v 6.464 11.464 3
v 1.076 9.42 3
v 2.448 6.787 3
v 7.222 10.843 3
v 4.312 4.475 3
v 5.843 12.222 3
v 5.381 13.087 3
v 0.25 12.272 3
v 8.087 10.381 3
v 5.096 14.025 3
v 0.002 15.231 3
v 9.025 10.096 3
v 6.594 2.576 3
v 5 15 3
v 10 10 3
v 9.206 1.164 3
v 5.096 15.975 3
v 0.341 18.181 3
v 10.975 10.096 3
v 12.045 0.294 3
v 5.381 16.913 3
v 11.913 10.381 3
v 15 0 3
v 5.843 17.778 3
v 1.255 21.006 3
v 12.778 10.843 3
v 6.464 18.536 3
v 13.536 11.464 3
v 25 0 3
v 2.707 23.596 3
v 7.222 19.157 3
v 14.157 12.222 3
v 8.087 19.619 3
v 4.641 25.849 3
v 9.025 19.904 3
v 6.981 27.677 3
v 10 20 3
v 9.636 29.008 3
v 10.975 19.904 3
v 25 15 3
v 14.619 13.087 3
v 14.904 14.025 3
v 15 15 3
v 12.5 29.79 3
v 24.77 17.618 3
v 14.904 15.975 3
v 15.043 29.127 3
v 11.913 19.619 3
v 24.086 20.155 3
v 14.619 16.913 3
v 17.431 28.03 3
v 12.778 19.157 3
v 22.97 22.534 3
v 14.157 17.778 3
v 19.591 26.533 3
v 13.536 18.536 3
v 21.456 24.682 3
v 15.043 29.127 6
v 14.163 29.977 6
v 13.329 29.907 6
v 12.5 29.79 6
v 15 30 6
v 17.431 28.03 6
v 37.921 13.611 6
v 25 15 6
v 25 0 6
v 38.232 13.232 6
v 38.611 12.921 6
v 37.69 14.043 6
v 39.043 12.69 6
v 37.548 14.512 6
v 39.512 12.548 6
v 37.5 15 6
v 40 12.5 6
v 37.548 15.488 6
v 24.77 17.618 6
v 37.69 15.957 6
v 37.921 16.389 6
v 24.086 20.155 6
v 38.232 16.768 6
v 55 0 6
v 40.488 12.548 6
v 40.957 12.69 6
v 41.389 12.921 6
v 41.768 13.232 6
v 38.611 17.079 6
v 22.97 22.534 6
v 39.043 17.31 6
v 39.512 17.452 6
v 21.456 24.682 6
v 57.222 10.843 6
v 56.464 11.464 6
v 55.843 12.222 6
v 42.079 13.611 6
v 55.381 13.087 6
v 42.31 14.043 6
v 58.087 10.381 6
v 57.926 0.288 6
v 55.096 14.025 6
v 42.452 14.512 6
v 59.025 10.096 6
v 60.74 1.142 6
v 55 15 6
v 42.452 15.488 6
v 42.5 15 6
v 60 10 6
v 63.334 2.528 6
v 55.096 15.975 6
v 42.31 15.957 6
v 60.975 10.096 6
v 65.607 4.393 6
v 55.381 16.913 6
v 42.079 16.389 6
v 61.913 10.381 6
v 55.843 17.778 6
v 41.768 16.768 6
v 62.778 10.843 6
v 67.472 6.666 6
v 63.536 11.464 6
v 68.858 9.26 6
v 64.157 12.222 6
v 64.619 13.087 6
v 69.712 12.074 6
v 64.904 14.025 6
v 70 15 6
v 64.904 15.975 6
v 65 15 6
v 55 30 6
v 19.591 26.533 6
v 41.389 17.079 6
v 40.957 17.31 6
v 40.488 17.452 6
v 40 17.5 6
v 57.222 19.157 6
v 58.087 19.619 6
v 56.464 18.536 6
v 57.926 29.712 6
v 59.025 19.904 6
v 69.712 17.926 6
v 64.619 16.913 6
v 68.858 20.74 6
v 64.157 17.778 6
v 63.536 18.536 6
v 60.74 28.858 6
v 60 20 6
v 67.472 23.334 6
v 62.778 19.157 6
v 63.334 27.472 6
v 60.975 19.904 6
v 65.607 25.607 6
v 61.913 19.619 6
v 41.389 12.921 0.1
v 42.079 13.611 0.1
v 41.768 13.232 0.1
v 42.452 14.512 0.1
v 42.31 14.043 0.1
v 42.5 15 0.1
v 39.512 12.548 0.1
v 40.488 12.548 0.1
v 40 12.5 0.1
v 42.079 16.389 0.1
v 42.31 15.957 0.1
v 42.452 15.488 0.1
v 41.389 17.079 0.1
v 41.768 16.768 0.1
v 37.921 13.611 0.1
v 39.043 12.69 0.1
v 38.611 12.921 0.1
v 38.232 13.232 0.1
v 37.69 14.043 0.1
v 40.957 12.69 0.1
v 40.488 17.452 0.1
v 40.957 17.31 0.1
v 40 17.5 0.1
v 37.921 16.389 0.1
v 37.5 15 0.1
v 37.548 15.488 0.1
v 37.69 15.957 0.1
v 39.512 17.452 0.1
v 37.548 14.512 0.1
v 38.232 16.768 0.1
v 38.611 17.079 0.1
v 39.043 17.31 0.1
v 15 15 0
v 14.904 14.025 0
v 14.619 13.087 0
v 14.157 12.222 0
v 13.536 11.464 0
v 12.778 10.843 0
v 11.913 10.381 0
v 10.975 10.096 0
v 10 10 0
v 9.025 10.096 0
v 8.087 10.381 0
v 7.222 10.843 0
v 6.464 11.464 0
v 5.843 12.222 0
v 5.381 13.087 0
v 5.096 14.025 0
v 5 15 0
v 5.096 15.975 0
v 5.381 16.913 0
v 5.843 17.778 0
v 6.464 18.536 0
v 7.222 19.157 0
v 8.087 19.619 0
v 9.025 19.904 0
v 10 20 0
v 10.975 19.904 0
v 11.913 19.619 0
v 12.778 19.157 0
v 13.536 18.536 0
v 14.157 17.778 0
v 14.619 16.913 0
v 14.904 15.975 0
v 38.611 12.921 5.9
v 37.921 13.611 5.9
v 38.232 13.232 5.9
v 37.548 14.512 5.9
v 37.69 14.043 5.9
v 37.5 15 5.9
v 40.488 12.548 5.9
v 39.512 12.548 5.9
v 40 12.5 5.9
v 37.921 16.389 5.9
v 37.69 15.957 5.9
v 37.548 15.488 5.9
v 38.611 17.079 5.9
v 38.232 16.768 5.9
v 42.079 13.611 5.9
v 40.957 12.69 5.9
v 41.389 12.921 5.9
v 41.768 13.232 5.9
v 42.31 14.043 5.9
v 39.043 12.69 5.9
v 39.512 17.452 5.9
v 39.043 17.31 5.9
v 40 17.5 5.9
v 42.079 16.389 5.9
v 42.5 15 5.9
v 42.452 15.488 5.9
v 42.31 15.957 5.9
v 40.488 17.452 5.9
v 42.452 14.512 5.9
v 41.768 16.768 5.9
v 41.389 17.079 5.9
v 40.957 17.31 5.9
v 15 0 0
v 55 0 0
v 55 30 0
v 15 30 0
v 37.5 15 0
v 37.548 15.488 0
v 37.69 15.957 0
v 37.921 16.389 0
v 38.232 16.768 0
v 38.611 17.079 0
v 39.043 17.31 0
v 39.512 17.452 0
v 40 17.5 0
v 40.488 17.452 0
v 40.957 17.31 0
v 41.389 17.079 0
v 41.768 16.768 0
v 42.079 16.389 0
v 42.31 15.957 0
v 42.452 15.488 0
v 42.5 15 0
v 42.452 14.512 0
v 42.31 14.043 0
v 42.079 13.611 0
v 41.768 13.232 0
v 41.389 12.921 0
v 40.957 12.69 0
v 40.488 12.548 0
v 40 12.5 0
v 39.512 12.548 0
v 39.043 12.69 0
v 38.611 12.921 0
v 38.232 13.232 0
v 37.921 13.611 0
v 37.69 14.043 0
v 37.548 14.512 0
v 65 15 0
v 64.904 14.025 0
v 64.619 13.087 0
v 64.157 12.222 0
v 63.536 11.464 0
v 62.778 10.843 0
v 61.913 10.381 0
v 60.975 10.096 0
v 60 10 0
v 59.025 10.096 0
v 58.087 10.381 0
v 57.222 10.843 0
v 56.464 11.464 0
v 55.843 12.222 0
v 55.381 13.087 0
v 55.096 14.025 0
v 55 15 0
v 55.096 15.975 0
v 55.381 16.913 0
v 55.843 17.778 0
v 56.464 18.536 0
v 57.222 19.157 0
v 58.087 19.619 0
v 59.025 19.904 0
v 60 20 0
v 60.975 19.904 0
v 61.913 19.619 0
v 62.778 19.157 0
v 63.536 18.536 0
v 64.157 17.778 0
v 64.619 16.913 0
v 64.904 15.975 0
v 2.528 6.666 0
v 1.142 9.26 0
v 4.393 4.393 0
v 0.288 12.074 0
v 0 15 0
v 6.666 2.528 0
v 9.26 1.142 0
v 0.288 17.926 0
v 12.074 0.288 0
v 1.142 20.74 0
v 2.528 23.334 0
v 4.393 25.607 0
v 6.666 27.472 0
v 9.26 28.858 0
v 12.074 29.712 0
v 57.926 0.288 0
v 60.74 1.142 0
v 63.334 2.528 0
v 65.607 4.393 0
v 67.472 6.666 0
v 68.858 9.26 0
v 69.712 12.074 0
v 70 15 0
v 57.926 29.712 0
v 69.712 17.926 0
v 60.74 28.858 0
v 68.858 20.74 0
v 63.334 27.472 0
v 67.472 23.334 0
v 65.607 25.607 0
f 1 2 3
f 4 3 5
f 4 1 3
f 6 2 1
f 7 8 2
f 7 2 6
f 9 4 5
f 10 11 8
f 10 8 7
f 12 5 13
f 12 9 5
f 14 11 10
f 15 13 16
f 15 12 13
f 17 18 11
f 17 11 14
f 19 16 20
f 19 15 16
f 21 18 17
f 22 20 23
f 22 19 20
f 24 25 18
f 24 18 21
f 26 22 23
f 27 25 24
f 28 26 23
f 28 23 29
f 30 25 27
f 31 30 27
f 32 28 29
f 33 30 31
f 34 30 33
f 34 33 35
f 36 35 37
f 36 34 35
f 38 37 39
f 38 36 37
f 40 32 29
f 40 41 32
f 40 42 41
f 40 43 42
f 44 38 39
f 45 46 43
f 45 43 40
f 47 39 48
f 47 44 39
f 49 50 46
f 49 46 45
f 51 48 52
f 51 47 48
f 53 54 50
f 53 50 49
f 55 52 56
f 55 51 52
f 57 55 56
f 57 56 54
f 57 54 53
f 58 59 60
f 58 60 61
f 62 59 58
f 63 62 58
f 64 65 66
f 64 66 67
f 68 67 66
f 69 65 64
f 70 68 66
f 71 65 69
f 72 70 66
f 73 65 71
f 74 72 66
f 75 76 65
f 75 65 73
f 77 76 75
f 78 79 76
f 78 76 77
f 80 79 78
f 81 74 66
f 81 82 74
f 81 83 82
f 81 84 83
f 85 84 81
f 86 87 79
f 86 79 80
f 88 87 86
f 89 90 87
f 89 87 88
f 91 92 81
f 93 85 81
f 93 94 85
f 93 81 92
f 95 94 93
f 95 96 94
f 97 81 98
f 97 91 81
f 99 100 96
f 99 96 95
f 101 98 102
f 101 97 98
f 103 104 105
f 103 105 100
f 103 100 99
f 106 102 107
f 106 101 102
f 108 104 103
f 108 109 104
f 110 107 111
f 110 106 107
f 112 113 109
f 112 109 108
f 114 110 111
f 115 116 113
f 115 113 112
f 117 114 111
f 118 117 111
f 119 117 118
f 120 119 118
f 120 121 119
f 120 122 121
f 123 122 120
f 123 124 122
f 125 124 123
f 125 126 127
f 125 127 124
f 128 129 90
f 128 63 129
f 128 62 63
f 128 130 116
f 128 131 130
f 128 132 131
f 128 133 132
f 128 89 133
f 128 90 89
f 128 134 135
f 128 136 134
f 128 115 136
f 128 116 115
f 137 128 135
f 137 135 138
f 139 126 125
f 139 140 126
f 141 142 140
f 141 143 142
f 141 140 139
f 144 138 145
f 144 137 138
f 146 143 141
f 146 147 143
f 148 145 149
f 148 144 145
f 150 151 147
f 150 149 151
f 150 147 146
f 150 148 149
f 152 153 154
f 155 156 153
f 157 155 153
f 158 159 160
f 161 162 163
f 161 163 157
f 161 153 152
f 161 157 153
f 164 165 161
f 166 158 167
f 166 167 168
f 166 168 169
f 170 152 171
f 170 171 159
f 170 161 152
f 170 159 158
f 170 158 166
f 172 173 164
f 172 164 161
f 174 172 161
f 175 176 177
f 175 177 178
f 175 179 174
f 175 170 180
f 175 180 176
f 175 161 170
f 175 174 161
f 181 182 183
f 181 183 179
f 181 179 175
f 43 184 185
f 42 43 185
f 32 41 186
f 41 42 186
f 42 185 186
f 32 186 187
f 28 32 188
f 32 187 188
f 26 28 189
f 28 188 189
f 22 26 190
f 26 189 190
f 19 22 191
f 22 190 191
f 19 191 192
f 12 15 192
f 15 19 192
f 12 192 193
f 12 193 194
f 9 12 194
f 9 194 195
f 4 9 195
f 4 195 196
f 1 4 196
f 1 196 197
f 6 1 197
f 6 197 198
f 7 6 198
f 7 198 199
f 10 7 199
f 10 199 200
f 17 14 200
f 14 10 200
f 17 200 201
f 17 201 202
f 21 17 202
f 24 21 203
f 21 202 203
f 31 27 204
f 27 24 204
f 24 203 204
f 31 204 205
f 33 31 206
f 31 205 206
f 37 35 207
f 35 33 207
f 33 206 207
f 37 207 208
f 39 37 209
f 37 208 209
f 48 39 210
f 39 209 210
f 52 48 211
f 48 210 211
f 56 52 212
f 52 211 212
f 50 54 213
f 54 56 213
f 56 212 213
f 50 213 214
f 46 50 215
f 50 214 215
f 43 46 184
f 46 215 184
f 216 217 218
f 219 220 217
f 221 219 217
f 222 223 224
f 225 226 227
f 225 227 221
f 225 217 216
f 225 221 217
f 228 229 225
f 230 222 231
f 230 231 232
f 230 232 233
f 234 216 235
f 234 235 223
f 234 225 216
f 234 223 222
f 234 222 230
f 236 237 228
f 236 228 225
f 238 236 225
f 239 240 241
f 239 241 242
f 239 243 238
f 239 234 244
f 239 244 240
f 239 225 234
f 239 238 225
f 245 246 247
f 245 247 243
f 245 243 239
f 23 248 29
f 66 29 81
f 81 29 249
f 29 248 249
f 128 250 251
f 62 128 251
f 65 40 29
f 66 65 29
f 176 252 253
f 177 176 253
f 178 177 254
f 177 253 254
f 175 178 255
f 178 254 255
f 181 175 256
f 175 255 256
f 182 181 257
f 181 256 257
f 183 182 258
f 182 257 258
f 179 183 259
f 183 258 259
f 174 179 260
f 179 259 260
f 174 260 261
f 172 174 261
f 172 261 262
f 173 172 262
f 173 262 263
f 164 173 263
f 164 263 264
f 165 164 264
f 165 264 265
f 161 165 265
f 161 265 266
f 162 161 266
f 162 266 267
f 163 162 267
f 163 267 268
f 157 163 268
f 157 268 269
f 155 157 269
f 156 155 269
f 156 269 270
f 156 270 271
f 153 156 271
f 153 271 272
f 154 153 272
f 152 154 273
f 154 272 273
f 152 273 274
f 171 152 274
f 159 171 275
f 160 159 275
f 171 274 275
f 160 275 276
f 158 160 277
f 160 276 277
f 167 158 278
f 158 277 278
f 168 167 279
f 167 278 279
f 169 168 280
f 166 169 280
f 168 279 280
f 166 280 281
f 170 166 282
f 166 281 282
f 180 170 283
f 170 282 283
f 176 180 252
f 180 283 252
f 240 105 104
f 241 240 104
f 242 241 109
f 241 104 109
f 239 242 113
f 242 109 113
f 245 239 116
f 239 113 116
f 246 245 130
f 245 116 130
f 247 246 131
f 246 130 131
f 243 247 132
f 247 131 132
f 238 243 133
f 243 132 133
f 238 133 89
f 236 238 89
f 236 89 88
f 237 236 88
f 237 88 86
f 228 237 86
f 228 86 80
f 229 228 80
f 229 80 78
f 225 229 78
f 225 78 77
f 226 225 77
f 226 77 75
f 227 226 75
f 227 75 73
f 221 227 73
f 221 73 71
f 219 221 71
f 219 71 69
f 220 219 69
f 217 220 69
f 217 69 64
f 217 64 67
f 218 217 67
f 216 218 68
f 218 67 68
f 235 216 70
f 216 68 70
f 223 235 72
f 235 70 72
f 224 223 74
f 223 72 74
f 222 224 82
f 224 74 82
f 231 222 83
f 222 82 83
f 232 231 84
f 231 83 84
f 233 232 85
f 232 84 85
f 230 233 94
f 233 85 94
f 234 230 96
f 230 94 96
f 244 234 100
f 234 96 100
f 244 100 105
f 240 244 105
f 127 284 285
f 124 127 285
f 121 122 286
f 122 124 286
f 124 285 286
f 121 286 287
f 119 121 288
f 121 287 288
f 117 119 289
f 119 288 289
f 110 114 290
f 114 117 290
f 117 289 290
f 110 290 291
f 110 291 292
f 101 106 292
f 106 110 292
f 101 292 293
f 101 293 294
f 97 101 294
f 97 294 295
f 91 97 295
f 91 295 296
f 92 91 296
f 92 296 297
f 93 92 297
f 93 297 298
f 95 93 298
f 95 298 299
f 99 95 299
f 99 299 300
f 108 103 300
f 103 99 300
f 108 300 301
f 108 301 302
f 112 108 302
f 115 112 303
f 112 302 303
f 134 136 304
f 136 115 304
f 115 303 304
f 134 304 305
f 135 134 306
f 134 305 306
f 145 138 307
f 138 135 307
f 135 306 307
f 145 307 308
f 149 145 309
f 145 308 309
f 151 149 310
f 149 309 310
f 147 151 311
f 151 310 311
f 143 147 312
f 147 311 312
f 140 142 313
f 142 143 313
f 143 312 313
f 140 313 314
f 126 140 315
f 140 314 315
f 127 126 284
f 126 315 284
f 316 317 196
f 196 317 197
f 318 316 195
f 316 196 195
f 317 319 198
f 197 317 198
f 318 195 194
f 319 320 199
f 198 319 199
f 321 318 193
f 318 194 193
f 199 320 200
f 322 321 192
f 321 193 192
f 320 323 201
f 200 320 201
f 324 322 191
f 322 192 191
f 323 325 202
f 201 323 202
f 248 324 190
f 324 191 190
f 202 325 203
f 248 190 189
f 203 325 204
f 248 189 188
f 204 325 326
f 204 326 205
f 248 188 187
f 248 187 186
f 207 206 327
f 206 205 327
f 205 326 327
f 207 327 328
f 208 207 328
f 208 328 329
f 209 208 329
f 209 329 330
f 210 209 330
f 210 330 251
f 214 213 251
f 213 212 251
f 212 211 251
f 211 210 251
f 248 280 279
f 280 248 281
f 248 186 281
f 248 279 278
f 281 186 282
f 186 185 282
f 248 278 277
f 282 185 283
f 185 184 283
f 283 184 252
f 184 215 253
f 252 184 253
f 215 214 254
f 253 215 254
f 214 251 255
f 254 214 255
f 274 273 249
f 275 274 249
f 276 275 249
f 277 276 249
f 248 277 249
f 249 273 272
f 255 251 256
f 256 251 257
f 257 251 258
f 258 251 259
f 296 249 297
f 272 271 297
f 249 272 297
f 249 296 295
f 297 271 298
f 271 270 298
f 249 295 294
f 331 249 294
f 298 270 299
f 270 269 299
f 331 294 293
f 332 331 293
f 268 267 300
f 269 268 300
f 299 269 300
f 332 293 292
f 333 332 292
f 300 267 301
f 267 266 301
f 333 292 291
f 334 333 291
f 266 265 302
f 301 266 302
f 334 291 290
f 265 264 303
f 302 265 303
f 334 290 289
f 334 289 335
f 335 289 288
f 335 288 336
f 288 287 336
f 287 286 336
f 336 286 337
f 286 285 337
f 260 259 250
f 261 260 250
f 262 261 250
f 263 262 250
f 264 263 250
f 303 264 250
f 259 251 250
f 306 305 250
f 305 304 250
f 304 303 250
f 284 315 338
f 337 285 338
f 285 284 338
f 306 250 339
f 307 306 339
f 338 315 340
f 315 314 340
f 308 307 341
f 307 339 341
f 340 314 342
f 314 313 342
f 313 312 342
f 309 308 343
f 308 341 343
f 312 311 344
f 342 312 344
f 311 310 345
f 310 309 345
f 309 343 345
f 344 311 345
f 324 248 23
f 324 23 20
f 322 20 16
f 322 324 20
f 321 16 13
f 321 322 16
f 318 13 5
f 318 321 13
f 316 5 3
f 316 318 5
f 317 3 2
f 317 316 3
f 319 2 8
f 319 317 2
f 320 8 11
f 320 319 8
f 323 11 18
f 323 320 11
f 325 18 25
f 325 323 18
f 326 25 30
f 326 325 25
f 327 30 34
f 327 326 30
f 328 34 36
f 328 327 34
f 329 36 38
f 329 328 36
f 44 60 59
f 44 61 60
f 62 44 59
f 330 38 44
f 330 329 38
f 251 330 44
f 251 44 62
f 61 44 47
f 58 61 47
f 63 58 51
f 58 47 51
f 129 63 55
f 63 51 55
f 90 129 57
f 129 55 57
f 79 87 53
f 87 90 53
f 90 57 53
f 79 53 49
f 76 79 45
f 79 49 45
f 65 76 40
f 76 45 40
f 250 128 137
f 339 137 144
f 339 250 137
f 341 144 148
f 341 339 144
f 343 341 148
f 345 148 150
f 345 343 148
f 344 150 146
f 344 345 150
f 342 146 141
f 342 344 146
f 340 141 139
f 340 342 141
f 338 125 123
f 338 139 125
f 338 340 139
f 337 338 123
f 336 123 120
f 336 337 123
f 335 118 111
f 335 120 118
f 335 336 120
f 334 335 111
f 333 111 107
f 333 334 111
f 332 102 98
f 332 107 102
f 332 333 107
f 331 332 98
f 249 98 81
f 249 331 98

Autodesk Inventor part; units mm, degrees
ref_plane "YZ Plane" through (0, 0, 0) normal (1, 0, 0) x (0, 1, 0)
ref_plane "XZ Plane" through (0, 0, 0) normal (0, 1, 0) x (-1, 0, 0)
ref_plane "XY Plane" through (0, 0, 0) normal (0, 0, 1) x (1, 0, 0)
sketch "Sketch1" plane through (0, 0, 0) normal (0, 0, 1) x (1, 0, 0)
  line L0 (15, 0) -> (55, 0)
  line L1 (70, 15) -> (70, 15)
  line L2 (55, 30) -> (15, 30)
  line L3 (0, 15) -> (0, 15)
  circle A0 centre (10, 15) radius 5
  circle A1 centre (60, 15) radius 5
  arc A2 (70, 15) -> (55, 30) centre (55, 15) ccw
  arc A3 (55, 0) -> (70, 15) centre (55, 15) ccw
  arc A4 (0, 15) -> (15, 0) centre (15, 15) ccw
  arc A5 (15, 30) -> (0, 15) centre (15, 15) ccw
  point P0 (0, 0)
  point P1 (70, 0)
  point P2 (70, 30)
  point P3 (0, 15)
  dimension "d1" = 30
  dimension "d14" = 10
  dimension "d15" = 10
  dimension "d16" = 10
  dimension "d17" = 50
  dimension "d18" = 15
  dimension "d21" = 15
extrude "Extrusion1" add sketch "Sketch1" along normal blind 3
sketch "Sketch3" plane through (0, 0, 3) normal (0, 0, 1) x (1, 0, 0)
  arc A0 (55, 0) -> (55, 30) centre (55, 15) ccw projected
  line L0 (55, 30) -> (15, 30) projected
  arc A1 (15, 30) -> (15, 0) centre (15, 15) ccw projected
  line L1 (15, 0) -> (55, 0) projected
  circle A2 centre (60, 15) radius 5 projected
  circle A3 centre (10, 15) radius 5 projected
  line L2 (55, 30) -> (15, 30) projected
  line L3 (25, 30) -> (25, 0)
  circle A4 centre (10, 15) radius 15
  circle A5 centre (10, 12) radius 15
  point P0 (0, 0)
  point P1 (12.5, 29.7902)
  point P2 (25, 15)
  dimension "d24" = 15
  dimension "d27" = 3
sketch "Sketch4" plane through (0, 0, 3) normal (0, 0, 1) x (1, 0, 0)
  point P0 (0, 0)
extrude "Extrusion3" add sketch "Sketch3" along normal blind 3 contours L1 L3 L0 A0 | L3 A4 A1 L0
sketch "Sketch5" plane through (0, 0, 0) normal (0, 0, -1) x (-1, 0, 0)
  circle A0 centre (-60, 15) radius 5 projected
  circle A1 centre (-10, 15) radius 5 projected
  circle A2 centre (-40, 15) radius 2.5
  line L0 (-25, 0) -> (-25, 15) projected
  point P0 (0, 0)
  dimension "d30" = 5
  dimension "d33" = 35
  dimension "d34" = 10
  dimension "d36" = 15
extrude "Extrusion4" cut sketch "Sketch5" against normal blind 0.1 contours A2
sketch "Sketch6" plane through (0, 0, 6) normal (0, 0, 1) x (1, 0, 0)
  circle A0 centre (40, 15) radius 2.5 projected
  point P0 (0, 0)
extrude "Extrusion5" cut sketch "Sketch6" against normal blind 0.1
equation "\"d1\" = d0"
equation "\"d14\" = d6"
equation "\"d15\" = d14"
equation "\"d16\" = d15"
equation "\"d18\" = 0.5 * d1"
equation "\"d21\" = 0.5 * d1"
equation "\"d19\" = d11"
equation "\"d24\" = 0.5 * d0"
equation "\"d27\" = 0.1 * d0"
equation "\"d25\" = d11"
equation "\"d36\" = 0.5 * d33 - 0.25 * d34"
equation "\"d6\" = 10"
equation "\"d11\" = 3"
equation "\"d0\" = 30"
properties part number "GripP3"
